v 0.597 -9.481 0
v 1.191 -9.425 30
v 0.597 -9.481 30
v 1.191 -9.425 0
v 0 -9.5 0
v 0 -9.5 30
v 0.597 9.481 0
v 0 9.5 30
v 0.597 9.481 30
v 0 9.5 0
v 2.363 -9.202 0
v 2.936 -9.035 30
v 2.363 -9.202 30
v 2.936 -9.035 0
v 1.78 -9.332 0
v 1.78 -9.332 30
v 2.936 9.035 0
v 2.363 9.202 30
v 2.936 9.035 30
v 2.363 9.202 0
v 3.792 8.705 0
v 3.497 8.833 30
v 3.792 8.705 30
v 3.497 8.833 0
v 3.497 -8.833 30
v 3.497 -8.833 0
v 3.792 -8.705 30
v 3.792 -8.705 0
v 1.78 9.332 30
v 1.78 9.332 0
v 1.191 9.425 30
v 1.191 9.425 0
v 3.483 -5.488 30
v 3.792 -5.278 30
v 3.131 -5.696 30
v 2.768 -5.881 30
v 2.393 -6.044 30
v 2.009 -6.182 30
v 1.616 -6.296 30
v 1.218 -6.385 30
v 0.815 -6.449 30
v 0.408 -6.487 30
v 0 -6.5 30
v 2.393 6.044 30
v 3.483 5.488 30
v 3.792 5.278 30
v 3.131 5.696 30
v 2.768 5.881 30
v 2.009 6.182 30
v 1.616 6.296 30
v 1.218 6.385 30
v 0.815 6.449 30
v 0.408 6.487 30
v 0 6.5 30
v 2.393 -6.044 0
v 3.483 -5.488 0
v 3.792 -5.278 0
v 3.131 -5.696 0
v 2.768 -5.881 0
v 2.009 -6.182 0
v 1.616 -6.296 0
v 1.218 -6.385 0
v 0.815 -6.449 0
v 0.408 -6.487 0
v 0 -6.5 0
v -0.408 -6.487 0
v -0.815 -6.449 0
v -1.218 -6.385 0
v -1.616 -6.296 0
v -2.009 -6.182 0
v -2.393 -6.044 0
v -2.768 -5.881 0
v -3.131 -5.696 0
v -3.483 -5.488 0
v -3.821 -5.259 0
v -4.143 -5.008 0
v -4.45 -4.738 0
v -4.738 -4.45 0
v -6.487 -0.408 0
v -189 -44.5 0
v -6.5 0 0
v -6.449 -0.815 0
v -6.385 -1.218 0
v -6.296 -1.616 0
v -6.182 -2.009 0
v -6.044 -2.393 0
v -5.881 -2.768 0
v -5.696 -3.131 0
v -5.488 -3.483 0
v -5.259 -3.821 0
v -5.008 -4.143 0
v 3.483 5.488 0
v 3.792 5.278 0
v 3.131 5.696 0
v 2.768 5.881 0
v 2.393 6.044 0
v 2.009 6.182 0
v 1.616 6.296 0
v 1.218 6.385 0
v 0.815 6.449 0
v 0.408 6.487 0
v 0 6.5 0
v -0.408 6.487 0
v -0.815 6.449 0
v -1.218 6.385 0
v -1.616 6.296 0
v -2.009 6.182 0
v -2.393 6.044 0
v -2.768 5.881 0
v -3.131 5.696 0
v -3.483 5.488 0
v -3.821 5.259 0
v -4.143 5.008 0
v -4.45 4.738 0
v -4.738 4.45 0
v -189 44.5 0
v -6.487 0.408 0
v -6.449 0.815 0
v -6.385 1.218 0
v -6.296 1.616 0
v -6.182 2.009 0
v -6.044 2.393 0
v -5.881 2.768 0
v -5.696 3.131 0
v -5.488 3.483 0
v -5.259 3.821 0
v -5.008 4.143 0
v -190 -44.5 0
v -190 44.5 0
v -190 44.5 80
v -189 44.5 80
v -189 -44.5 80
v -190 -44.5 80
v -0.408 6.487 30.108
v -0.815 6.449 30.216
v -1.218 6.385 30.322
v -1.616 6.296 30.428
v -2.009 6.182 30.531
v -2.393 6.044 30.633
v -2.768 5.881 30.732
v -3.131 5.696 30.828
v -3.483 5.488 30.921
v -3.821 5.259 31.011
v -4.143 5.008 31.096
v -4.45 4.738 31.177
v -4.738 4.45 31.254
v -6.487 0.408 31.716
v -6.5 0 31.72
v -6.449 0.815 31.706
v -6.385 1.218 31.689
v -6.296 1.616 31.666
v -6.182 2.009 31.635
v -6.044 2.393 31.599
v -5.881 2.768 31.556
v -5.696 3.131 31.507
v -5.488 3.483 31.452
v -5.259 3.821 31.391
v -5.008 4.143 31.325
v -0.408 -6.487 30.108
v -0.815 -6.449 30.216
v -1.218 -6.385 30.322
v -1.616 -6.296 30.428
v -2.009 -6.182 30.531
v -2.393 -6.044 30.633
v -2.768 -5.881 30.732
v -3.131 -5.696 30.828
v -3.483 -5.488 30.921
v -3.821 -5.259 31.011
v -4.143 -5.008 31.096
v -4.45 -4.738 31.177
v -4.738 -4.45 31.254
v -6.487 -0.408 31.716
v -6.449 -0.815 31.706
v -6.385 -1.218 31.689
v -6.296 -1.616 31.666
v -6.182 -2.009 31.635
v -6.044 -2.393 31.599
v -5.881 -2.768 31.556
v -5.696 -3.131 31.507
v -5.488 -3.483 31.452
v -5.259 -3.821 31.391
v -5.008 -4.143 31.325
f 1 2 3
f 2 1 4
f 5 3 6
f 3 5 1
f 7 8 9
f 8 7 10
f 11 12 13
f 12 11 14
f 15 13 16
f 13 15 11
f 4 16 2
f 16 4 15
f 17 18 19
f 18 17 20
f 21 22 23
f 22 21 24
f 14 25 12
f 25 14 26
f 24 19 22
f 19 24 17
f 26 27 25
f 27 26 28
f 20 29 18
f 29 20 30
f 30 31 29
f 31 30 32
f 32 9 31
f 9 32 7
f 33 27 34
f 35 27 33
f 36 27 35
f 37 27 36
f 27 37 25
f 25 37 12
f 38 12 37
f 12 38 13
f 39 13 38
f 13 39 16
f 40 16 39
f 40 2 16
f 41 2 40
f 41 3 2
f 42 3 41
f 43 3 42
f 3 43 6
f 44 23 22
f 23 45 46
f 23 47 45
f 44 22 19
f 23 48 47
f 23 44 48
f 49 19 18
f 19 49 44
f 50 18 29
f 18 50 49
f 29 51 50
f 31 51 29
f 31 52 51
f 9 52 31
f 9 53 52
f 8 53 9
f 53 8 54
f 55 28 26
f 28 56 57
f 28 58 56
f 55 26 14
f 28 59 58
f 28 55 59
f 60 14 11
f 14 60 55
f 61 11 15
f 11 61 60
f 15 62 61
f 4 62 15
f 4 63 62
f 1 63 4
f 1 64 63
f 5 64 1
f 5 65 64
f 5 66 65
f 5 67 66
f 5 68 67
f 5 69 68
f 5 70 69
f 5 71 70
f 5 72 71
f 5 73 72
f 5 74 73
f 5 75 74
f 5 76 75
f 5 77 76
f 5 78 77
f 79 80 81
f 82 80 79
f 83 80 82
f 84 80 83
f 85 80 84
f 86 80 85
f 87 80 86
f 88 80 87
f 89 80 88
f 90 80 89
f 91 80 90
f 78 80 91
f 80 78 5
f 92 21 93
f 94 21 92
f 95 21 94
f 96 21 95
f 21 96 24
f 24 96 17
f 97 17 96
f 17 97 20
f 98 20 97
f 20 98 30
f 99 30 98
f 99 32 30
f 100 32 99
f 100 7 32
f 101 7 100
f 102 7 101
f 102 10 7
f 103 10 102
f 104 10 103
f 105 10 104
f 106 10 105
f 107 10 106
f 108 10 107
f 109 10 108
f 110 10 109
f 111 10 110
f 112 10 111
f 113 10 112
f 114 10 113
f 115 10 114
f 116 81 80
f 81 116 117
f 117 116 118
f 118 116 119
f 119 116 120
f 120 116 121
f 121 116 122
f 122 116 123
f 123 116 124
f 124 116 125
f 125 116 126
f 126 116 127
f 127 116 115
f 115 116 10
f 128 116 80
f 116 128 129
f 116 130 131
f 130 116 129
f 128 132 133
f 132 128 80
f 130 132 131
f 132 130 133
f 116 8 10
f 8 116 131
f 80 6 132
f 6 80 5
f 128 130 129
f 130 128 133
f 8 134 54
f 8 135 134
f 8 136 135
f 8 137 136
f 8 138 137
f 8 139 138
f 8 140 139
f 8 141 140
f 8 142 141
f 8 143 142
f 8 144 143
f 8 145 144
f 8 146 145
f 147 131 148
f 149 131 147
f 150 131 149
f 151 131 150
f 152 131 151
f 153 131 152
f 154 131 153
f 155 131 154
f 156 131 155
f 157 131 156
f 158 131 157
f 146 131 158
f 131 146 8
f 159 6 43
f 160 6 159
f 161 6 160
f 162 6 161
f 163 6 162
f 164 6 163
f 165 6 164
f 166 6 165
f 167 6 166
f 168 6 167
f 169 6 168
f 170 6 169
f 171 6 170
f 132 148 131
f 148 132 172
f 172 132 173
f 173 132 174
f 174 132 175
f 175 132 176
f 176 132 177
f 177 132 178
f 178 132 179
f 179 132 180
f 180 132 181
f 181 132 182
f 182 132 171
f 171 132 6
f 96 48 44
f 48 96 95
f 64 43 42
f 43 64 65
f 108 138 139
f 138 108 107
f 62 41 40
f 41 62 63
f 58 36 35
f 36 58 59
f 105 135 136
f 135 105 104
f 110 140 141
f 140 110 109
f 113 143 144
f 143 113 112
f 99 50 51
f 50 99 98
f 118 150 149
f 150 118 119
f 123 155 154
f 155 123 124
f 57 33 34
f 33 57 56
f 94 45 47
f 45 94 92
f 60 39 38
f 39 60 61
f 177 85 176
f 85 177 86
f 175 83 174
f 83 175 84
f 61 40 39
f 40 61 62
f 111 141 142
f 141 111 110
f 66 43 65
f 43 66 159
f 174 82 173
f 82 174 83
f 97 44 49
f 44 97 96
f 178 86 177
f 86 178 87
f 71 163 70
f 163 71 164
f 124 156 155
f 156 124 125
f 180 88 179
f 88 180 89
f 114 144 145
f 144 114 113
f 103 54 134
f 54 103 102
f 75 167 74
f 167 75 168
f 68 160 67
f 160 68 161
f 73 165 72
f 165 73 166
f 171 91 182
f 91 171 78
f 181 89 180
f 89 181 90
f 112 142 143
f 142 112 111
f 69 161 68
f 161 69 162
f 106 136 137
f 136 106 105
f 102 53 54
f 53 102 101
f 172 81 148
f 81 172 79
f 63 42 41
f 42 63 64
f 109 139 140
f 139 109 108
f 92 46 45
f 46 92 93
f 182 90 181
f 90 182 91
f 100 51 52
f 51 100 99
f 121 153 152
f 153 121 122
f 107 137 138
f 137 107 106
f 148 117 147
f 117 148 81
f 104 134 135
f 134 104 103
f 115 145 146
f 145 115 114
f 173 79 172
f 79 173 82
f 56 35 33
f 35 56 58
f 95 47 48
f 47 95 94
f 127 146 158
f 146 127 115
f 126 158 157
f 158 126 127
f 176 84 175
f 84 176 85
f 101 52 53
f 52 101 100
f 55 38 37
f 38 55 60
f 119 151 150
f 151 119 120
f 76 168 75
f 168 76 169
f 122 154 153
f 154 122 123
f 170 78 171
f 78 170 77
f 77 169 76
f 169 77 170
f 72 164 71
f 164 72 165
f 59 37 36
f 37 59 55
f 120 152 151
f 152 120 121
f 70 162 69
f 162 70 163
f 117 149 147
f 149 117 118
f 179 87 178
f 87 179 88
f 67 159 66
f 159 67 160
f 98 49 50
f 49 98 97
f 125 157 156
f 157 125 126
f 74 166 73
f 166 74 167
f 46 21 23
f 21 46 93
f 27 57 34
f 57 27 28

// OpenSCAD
$fn = 100;
footrest_pole_radius = 13/2;
footrest_pole_length = 30;
extra_width = 70;
extra_depth = 50;

module connector()
{
    gripper_width = 6;
    total_width = footrest_pole_radius * 2 + gripper_width;
    
    difference()
    {
        union()
        {
            //Main structural sidewall
            cylinder
            (
                h = footrest_pole_length,
                r = footrest_pole_radius + (gripper_width / 2),
                center = false
            );

            lifter
            (
                total_width = total_width,
                raise_height = 160
            );
        }

        //Drill out interior
        cylinder
        (
            h = footrest_pole_length + extra_depth,
            r = footrest_pole_radius,
            center = false
        );

        //Create opening for intallation
        translate
        (
            [
                footrest_pole_radius - (5 / 12) * footrest_pole_radius,
                -total_width / 2,
                0
            ]
        )
        {
            cube
            (
                size =
                [
                    total_width,
                    total_width,
                    footrest_pole_length
                ]
            );
        }
    }
}

module lifter
(
    total_width = 1,
    raise_height = 1
)
{
    hull()
    {
        //Vertical structure
        translate
        (
            [
                -footrest_pole_length - raise_height,
                -total_width / 2,
                0
            ]
        )
        {
            cube
            (
                [
                    footrest_pole_length + raise_height,
                    total_width,
                    footrest_pole_length
                ]
            );
        }

        //Stabilization foot
        translate
        (
            [
                -footrest_pole_length - raise_height,
                - (total_width + extra_width) / 2,
                0
            ]
        )
        {
            cube
            (
                [
                    1,
                    total_width + extra_width,
                    footrest_pole_length + extra_depth
                ]
            );
        }
    }
}

module mainBody()
{
    connector();
}

module main()
{
    rotate(a=[0,0,0])
    {
        mainBody();
    }
}

main();
